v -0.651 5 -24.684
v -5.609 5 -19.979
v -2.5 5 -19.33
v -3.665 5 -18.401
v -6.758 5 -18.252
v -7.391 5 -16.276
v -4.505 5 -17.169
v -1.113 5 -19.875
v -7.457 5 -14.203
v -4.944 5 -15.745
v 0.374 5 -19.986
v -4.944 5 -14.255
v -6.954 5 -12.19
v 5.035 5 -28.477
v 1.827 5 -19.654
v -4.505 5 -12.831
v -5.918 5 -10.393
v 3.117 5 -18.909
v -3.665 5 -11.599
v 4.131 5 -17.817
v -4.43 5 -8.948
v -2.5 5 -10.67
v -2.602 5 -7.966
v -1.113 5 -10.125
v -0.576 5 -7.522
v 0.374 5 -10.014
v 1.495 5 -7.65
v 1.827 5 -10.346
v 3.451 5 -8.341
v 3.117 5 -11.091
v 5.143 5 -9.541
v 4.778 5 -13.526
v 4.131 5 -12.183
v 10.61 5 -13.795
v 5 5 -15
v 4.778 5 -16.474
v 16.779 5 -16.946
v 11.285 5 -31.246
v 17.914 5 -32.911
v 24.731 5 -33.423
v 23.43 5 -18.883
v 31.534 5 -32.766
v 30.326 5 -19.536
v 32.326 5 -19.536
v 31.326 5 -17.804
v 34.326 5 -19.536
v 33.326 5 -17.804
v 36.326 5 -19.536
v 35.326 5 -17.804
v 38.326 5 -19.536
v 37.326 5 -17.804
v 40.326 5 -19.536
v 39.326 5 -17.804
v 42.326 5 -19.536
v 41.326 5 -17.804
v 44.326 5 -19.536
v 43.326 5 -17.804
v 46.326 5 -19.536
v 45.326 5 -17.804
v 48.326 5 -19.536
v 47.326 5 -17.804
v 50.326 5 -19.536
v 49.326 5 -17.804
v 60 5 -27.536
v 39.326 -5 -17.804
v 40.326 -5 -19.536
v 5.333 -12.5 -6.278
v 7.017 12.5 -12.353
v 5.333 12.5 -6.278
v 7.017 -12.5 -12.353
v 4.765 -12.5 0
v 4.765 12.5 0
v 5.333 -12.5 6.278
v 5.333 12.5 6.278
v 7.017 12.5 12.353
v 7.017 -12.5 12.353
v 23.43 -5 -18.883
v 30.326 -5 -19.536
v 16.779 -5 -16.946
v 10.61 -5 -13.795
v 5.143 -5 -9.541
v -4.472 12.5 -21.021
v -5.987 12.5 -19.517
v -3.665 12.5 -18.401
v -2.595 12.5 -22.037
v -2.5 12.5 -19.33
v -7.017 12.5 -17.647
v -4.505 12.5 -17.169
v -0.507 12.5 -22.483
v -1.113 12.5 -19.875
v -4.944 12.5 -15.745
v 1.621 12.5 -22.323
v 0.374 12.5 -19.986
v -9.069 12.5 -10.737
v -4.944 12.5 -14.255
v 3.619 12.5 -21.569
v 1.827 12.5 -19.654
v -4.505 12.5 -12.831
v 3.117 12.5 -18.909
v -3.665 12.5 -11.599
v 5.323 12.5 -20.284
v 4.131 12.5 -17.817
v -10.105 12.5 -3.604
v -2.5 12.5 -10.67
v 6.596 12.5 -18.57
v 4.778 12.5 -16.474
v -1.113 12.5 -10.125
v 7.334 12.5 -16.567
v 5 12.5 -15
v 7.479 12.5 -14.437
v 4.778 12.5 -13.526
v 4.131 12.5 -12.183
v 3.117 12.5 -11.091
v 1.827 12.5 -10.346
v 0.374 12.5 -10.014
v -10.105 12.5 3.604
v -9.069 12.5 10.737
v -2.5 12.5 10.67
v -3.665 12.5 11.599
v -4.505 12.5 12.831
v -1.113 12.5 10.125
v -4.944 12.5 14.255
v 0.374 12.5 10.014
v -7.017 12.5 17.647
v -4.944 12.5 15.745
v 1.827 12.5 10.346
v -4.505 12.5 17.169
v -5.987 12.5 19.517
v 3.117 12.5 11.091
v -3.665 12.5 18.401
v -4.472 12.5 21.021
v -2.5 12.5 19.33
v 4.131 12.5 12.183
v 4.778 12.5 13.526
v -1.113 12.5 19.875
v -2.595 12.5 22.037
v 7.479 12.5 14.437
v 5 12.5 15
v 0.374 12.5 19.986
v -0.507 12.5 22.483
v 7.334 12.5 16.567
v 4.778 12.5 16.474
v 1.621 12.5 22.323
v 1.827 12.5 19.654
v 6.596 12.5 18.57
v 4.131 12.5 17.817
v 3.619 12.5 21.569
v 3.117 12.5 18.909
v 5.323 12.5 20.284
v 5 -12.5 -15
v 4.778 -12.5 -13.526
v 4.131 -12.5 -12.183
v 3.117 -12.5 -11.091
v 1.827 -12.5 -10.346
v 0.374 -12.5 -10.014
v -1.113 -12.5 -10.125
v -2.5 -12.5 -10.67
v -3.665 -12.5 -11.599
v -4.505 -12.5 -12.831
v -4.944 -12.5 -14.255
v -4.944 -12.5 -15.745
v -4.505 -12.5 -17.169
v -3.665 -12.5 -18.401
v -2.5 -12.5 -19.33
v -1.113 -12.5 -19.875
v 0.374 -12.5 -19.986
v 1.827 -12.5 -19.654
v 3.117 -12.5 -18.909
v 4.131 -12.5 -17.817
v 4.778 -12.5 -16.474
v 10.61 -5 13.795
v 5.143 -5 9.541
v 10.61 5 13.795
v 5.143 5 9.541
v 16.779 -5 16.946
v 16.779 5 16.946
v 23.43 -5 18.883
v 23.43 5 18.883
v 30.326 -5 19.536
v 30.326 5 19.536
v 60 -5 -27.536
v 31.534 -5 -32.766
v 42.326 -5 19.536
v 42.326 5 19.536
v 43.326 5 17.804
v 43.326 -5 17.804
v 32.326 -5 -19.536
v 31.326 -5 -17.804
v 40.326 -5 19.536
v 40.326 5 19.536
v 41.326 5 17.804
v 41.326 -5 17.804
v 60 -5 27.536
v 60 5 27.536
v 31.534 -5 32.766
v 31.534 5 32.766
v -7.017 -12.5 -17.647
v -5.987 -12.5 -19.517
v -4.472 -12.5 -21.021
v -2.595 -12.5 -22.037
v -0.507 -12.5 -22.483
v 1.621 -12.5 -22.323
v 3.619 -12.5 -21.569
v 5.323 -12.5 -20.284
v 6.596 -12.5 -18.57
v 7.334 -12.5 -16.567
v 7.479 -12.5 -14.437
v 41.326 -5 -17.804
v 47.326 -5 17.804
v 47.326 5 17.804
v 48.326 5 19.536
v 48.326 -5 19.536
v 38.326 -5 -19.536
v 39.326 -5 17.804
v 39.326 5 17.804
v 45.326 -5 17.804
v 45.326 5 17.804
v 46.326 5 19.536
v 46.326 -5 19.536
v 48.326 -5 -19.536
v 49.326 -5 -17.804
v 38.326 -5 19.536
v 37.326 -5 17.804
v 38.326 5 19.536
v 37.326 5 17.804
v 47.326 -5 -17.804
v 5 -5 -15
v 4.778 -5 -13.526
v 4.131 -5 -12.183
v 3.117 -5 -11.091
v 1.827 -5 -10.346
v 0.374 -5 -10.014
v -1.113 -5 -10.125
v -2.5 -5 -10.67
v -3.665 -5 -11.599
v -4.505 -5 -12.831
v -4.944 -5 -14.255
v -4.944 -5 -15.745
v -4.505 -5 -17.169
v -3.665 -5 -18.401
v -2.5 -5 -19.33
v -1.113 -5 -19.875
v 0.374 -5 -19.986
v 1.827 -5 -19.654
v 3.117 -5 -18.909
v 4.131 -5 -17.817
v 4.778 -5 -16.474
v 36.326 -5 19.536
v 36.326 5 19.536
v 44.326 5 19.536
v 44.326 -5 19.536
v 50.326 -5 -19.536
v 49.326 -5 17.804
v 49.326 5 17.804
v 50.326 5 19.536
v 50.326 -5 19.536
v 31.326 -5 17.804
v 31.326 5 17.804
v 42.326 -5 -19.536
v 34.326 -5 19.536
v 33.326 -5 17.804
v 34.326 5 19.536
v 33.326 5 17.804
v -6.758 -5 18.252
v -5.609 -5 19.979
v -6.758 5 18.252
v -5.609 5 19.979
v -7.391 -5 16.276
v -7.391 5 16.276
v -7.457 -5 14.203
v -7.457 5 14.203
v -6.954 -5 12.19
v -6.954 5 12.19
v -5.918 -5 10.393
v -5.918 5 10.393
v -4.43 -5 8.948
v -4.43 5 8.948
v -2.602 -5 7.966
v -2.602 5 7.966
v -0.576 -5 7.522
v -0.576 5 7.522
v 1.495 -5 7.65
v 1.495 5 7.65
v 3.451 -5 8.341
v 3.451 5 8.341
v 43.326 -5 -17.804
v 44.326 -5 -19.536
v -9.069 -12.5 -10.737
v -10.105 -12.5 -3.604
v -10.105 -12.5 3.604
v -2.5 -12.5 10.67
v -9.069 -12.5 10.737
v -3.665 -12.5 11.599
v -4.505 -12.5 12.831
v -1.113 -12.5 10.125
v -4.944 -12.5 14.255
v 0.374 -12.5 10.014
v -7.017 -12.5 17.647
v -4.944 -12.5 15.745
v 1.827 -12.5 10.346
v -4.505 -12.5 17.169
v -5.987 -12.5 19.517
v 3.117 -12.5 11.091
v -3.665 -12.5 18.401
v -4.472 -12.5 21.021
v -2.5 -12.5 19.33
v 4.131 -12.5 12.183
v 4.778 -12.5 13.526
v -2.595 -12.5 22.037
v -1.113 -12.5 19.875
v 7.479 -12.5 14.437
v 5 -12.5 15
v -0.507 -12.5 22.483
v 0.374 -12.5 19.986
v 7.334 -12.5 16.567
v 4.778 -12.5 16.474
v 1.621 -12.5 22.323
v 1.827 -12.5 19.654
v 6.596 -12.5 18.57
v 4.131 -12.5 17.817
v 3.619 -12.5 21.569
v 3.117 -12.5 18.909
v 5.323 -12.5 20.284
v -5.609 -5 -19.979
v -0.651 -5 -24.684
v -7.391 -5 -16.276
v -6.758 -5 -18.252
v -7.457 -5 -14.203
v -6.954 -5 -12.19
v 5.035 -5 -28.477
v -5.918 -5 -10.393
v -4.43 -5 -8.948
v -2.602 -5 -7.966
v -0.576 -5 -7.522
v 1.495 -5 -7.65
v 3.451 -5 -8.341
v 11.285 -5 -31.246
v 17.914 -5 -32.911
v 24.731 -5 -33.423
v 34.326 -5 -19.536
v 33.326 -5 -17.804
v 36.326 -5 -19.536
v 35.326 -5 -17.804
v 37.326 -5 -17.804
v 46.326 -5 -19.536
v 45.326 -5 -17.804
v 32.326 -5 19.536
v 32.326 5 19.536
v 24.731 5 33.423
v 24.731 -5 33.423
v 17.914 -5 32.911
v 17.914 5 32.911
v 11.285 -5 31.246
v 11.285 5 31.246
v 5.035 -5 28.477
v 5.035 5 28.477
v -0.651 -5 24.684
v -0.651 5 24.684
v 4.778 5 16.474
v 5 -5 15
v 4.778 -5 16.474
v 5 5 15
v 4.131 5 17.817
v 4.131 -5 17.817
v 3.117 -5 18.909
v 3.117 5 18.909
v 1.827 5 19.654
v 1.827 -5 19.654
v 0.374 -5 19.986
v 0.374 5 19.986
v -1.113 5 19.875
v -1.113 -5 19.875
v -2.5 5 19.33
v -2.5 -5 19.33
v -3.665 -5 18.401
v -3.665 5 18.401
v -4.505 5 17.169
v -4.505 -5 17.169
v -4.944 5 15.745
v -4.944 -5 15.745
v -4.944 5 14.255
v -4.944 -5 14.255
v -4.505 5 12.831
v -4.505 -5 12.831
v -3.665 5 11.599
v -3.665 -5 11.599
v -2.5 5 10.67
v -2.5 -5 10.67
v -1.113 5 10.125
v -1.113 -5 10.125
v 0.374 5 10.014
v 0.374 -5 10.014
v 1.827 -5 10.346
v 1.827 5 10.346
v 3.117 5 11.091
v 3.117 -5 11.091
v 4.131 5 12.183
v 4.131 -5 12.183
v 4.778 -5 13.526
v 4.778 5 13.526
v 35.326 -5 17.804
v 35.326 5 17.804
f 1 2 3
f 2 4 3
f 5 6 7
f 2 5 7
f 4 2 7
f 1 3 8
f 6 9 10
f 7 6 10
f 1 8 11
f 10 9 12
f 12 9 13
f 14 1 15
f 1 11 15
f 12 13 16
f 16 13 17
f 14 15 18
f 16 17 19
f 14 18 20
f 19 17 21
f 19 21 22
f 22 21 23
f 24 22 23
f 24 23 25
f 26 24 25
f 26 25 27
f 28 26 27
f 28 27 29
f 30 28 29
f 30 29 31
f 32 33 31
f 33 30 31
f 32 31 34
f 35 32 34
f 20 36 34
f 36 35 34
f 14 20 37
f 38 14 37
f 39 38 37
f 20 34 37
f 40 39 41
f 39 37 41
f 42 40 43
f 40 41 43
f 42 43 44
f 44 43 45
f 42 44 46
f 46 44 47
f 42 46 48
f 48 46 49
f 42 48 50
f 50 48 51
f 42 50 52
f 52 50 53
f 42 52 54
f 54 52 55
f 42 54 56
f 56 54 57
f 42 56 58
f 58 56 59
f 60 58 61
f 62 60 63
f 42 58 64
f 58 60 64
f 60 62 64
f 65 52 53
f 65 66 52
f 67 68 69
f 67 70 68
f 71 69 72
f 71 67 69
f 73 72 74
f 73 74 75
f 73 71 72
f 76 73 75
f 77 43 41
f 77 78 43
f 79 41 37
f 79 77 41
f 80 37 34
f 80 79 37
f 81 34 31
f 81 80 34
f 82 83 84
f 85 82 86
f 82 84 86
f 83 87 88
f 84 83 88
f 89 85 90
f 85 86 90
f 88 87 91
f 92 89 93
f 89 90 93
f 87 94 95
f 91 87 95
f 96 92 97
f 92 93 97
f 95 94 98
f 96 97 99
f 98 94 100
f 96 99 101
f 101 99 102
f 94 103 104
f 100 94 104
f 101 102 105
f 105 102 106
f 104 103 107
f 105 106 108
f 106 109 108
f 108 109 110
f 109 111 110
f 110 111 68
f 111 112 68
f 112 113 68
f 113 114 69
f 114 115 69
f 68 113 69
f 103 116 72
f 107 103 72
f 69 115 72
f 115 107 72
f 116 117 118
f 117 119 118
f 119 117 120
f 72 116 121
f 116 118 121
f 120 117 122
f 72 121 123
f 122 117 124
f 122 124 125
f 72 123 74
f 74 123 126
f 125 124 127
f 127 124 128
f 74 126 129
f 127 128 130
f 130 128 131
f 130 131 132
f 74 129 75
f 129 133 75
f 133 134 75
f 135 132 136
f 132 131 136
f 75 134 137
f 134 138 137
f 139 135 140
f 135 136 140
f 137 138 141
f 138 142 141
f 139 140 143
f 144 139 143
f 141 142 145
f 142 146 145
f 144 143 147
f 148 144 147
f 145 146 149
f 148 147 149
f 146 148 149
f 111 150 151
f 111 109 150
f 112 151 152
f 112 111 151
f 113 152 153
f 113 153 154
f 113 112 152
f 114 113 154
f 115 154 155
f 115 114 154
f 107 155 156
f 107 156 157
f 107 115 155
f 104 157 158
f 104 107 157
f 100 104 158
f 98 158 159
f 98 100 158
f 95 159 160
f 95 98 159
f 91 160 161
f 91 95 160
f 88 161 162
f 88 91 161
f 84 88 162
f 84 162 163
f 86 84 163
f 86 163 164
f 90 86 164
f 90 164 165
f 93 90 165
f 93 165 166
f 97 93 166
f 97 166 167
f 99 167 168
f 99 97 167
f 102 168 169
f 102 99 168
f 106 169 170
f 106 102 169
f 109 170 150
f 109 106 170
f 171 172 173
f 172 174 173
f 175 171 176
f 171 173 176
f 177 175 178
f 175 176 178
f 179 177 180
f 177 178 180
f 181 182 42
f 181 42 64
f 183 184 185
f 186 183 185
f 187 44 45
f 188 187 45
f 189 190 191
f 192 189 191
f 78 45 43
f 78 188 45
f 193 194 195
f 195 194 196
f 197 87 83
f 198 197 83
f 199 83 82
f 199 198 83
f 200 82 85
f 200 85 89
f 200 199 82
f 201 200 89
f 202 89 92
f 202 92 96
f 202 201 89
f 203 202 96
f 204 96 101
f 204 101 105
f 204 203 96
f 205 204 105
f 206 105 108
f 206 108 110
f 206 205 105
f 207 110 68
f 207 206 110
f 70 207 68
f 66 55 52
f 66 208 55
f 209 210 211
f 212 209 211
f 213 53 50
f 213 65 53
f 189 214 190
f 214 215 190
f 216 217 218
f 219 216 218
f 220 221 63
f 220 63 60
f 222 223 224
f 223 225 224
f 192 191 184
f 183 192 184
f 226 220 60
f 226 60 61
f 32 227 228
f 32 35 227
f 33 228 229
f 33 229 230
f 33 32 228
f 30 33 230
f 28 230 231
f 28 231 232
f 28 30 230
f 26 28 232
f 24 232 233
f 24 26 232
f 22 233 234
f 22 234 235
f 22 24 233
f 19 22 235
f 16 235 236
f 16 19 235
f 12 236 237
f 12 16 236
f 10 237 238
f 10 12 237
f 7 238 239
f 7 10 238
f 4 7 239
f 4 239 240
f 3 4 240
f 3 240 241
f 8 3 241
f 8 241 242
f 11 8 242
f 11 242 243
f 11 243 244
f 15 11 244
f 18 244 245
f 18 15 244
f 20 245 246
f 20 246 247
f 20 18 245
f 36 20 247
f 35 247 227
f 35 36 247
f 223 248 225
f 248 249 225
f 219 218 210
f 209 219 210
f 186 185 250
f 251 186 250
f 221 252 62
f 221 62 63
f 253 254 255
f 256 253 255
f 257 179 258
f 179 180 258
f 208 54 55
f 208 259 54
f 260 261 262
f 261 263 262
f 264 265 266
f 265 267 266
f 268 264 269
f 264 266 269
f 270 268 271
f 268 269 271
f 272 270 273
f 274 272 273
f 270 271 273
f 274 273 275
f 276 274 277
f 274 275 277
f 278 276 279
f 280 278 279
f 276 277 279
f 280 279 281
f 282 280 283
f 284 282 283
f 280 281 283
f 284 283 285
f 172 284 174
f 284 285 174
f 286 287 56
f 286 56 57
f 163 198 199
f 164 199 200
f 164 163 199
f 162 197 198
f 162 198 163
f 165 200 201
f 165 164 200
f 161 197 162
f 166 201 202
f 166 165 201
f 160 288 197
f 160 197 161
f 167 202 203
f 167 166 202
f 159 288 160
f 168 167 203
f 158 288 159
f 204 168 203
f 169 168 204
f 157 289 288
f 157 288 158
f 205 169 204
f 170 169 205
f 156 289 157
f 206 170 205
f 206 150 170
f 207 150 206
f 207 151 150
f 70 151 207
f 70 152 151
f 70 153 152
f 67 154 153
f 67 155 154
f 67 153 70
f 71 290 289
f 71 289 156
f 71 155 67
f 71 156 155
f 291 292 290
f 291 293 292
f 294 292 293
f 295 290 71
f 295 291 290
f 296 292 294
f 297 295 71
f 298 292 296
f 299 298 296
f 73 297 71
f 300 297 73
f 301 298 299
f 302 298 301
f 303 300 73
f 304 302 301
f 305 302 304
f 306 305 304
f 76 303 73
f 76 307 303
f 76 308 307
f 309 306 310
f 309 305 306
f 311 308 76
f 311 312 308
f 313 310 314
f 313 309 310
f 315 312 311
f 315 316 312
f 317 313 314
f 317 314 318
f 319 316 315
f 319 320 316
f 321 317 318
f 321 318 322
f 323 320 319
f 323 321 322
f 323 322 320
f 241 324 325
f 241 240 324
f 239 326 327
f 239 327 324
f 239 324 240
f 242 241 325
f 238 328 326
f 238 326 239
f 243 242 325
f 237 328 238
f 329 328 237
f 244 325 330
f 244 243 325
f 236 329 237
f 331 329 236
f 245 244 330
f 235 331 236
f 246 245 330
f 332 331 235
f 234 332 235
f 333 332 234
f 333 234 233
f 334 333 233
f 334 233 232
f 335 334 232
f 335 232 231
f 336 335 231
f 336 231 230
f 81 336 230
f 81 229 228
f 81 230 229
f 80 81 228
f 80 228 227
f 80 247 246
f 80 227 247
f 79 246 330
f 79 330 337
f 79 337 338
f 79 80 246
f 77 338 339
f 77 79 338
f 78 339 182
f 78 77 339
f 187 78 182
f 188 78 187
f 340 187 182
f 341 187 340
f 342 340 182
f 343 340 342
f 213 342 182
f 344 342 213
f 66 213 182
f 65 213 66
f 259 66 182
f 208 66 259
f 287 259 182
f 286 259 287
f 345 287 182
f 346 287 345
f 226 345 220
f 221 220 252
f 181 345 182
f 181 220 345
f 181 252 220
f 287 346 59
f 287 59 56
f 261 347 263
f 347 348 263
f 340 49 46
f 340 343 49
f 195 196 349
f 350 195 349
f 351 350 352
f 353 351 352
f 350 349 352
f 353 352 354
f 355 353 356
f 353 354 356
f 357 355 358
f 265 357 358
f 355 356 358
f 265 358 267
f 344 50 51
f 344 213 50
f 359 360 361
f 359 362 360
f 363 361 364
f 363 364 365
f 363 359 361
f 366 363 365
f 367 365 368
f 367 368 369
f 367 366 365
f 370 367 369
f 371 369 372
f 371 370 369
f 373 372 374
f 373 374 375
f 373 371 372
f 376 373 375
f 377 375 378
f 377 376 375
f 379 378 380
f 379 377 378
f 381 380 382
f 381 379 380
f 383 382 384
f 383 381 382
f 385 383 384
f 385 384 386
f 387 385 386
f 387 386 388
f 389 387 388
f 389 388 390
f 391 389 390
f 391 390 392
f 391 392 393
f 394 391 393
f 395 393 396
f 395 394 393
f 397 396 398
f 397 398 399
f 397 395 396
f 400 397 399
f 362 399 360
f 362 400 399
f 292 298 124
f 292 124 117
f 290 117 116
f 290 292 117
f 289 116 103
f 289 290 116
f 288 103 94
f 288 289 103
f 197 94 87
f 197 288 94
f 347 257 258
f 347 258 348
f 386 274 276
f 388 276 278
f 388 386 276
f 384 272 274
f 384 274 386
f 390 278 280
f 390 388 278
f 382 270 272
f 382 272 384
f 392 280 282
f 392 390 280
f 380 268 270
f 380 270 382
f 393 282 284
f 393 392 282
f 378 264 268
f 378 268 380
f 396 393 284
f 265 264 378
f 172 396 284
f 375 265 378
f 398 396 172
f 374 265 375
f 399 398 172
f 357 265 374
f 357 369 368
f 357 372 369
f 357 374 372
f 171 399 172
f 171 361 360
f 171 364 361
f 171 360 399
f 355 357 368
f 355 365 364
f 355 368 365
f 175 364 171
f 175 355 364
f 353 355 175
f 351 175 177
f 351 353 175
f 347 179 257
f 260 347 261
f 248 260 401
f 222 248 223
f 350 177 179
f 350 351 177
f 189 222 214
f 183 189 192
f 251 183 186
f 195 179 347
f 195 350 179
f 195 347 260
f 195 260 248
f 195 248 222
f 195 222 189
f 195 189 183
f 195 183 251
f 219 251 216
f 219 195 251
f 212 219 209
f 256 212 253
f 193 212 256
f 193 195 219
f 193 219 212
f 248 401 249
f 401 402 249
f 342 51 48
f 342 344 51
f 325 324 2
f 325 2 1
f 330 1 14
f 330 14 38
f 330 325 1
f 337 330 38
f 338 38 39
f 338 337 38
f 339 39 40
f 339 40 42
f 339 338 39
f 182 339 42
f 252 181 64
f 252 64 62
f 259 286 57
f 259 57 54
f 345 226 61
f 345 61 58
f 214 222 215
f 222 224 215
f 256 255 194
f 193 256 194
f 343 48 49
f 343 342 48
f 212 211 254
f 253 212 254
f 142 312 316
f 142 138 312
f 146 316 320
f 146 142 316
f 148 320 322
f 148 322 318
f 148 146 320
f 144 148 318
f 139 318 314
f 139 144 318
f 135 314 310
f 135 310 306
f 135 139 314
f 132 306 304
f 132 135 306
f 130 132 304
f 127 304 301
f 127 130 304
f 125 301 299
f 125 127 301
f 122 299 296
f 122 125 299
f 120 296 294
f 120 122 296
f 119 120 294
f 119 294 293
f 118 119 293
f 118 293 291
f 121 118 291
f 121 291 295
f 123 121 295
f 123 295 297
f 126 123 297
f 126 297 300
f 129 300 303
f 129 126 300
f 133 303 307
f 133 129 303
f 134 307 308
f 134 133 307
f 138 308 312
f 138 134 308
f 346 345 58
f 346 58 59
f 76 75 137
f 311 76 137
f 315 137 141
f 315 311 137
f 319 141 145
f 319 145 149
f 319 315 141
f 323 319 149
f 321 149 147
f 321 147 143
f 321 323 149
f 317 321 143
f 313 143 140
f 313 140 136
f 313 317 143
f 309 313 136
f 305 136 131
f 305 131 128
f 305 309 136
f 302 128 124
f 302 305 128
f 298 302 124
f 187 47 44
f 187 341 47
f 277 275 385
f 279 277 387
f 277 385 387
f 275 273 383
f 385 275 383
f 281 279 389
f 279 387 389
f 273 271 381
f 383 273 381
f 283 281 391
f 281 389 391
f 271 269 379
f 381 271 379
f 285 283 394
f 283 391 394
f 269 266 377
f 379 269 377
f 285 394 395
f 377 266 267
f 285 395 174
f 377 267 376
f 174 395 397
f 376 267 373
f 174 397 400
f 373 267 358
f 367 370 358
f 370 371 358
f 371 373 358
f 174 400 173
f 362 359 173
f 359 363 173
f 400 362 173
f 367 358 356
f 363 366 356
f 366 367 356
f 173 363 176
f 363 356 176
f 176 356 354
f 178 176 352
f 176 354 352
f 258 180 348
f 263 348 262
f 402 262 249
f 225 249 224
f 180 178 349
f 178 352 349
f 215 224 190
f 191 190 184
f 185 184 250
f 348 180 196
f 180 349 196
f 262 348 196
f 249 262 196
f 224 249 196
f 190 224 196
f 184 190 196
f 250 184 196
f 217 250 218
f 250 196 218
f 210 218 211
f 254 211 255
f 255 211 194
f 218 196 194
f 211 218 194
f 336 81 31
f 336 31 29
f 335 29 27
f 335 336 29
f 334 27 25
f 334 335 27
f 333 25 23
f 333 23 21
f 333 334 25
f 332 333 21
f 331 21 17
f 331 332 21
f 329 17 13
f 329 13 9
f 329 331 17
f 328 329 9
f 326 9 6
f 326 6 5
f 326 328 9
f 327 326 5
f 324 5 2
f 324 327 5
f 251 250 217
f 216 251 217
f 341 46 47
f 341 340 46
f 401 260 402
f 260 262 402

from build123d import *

# Parameters (mm, degrees)
F0_R     = 5
F2_DEPTH = 12.5
F1_R     = 5
F3_DEPTH = 5


with BuildPart() as f2:
    # F0 (on Front) → F2 (new body, symmetric)
    with BuildSketch(Plane.XZ):
        with BuildLine():
            ThreePointArc((7.017341, -12.352941), (4.764934, 0), (7.017341, 12.352941))
            ThreePointArc((7.017341, 12.352941), (2.647059, 22.017341), (-7.017341, 17.647059))
            ThreePointArc((-7.017341, 17.647059), (-10.235066, 0), (-7.017341, -17.647059))
            ThreePointArc((-7.017341, -17.647059), (2.647059, -22.017341), (7.017341, -12.352941))
        make_face()
        with Locations((0, -15)):
            Circle(F0_R, mode=Mode.SUBTRACT)
        with Locations((0, 15)):
            Circle(F0_R, mode=Mode.SUBTRACT)
    extrude(amount=F2_DEPTH, both=True)


with BuildPart() as f3:
    # F1 (on Front) → F3 (new body, symmetric)
    with BuildSketch(Plane.XZ):
        with BuildLine():
            ThreePointArc((31.534432, 32.766249), (11.284846, 31.246278), (-5.608991, 19.978877))
            ThreePointArc((-5.608991, 19.978877), (-5.224011, 9.618577), (5.143151, 9.541246))
            ThreePointArc((5.143151, 9.541246), (16.778966, 16.945849), (30.325638, 19.535829))
            Line((30.325638, 19.535829), (31.325638, 17.803778))
            Line((31.325638, 17.803778), (32.325638, 19.535829))
            Line((32.325638, 19.535829), (33.325638, 17.803778))
            Line((33.325638, 17.803778), (34.325638, 19.535829))
            Line((34.325638, 19.535829), (35.325638, 17.803778))
            Line((35.325638, 17.803778), (36.325638, 19.535829))
            Line((36.325638, 19.535829), (37.325638, 17.803778))
            Line((37.325638, 17.803778), (38.325638, 19.535829))
            Line((38.325638, 19.535829), (39.325638, 17.803778))
            Line((39.325638, 17.803778), (40.325638, 19.535829))
            Line((40.325638, 19.535829), (41.325638, 17.803778))
            Line((41.325638, 17.803778), (42.325638, 19.535829))
            Line((42.325638, 19.535829), (43.325638, 17.803778))
            Line((43.325638, 17.803778), (44.325638, 19.535829))
            Line((44.325638, 19.535829), (45.325638, 17.803778))
            Line((45.325638, 17.803778), (46.325638, 19.535829))
            Line((46.325638, 19.535829), (47.325638, 17.803778))
            Line((47.325638, 17.803778), (48.325638, 19.535829))
            Line((48.325638, 19.535829), (49.325638, 17.803778))
            Line((49.325638, 17.803778), (50.325638, 19.535829))
            Line((50.325638, 19.535829), (60, 27.535829))
            Line((60, 27.535829), (31.534432, 32.766249))
        make_face()
        with Locations((0, 15)):
            Circle(F1_R, mode=Mode.SUBTRACT)
        with BuildLine():
            ThreePointArc((30.325638, -19.535829), (16.778966, -16.945849), (5.143151, -9.541246))
            ThreePointArc((5.143151, -9.541246), (-5.224011, -9.618577), (-5.608991, -19.978877))
            ThreePointArc((-5.608991, -19.978877), (11.284846, -31.246278), (31.534432, -32.766249))
            Line((31.534432, -32.766249), (60, -27.535829))
            Line((60, -27.535829), (50.325638, -19.535829))
            Line((50.325638, -19.535829), (49.325638, -17.803778))
            Line((49.325638, -17.803778), (48.325638, -19.535829))
            Line((48.325638, -19.535829), (47.325638, -17.803778))
            Line((47.325638, -17.803778), (46.325638, -19.535829))
            Line((46.325638, -19.535829), (45.325638, -17.803778))
            Line((45.325638, -17.803778), (44.325638, -19.535829))
            Line((44.325638, -19.535829), (43.325638, -17.803778))
            Line((43.325638, -17.803778), (42.325638, -19.535829))
            Line((42.325638, -19.535829), (41.325638, -17.803778))
            Line((41.325638, -17.803778), (40.325638, -19.535829))
            Line((40.325638, -19.535829), (39.325638, -17.803778))
            Line((39.325638, -17.803778), (38.325638, -19.535829))
            Line((38.325638, -19.535829), (37.325638, -17.803778))
            Line((37.325638, -17.803778), (36.325638, -19.535829))
            Line((36.325638, -19.535829), (35.325638, -17.803778))
            Line((35.325638, -17.803778), (34.325638, -19.535829))
            Line((34.325638, -19.535829), (33.325638, -17.803778))
            Line((33.325638, -17.803778), (32.325638, -19.535829))
            Line((32.325638, -19.535829), (31.325638, -17.803778))
            Line((31.325638, -17.803778), (30.325638, -19.535829))
        make_face()
        with Locations((0, -15)):
            Circle(F1_R, mode=Mode.SUBTRACT)
    extrude(amount=F3_DEPTH, both=True)


solid = Compound([f2.part, f3.part])
